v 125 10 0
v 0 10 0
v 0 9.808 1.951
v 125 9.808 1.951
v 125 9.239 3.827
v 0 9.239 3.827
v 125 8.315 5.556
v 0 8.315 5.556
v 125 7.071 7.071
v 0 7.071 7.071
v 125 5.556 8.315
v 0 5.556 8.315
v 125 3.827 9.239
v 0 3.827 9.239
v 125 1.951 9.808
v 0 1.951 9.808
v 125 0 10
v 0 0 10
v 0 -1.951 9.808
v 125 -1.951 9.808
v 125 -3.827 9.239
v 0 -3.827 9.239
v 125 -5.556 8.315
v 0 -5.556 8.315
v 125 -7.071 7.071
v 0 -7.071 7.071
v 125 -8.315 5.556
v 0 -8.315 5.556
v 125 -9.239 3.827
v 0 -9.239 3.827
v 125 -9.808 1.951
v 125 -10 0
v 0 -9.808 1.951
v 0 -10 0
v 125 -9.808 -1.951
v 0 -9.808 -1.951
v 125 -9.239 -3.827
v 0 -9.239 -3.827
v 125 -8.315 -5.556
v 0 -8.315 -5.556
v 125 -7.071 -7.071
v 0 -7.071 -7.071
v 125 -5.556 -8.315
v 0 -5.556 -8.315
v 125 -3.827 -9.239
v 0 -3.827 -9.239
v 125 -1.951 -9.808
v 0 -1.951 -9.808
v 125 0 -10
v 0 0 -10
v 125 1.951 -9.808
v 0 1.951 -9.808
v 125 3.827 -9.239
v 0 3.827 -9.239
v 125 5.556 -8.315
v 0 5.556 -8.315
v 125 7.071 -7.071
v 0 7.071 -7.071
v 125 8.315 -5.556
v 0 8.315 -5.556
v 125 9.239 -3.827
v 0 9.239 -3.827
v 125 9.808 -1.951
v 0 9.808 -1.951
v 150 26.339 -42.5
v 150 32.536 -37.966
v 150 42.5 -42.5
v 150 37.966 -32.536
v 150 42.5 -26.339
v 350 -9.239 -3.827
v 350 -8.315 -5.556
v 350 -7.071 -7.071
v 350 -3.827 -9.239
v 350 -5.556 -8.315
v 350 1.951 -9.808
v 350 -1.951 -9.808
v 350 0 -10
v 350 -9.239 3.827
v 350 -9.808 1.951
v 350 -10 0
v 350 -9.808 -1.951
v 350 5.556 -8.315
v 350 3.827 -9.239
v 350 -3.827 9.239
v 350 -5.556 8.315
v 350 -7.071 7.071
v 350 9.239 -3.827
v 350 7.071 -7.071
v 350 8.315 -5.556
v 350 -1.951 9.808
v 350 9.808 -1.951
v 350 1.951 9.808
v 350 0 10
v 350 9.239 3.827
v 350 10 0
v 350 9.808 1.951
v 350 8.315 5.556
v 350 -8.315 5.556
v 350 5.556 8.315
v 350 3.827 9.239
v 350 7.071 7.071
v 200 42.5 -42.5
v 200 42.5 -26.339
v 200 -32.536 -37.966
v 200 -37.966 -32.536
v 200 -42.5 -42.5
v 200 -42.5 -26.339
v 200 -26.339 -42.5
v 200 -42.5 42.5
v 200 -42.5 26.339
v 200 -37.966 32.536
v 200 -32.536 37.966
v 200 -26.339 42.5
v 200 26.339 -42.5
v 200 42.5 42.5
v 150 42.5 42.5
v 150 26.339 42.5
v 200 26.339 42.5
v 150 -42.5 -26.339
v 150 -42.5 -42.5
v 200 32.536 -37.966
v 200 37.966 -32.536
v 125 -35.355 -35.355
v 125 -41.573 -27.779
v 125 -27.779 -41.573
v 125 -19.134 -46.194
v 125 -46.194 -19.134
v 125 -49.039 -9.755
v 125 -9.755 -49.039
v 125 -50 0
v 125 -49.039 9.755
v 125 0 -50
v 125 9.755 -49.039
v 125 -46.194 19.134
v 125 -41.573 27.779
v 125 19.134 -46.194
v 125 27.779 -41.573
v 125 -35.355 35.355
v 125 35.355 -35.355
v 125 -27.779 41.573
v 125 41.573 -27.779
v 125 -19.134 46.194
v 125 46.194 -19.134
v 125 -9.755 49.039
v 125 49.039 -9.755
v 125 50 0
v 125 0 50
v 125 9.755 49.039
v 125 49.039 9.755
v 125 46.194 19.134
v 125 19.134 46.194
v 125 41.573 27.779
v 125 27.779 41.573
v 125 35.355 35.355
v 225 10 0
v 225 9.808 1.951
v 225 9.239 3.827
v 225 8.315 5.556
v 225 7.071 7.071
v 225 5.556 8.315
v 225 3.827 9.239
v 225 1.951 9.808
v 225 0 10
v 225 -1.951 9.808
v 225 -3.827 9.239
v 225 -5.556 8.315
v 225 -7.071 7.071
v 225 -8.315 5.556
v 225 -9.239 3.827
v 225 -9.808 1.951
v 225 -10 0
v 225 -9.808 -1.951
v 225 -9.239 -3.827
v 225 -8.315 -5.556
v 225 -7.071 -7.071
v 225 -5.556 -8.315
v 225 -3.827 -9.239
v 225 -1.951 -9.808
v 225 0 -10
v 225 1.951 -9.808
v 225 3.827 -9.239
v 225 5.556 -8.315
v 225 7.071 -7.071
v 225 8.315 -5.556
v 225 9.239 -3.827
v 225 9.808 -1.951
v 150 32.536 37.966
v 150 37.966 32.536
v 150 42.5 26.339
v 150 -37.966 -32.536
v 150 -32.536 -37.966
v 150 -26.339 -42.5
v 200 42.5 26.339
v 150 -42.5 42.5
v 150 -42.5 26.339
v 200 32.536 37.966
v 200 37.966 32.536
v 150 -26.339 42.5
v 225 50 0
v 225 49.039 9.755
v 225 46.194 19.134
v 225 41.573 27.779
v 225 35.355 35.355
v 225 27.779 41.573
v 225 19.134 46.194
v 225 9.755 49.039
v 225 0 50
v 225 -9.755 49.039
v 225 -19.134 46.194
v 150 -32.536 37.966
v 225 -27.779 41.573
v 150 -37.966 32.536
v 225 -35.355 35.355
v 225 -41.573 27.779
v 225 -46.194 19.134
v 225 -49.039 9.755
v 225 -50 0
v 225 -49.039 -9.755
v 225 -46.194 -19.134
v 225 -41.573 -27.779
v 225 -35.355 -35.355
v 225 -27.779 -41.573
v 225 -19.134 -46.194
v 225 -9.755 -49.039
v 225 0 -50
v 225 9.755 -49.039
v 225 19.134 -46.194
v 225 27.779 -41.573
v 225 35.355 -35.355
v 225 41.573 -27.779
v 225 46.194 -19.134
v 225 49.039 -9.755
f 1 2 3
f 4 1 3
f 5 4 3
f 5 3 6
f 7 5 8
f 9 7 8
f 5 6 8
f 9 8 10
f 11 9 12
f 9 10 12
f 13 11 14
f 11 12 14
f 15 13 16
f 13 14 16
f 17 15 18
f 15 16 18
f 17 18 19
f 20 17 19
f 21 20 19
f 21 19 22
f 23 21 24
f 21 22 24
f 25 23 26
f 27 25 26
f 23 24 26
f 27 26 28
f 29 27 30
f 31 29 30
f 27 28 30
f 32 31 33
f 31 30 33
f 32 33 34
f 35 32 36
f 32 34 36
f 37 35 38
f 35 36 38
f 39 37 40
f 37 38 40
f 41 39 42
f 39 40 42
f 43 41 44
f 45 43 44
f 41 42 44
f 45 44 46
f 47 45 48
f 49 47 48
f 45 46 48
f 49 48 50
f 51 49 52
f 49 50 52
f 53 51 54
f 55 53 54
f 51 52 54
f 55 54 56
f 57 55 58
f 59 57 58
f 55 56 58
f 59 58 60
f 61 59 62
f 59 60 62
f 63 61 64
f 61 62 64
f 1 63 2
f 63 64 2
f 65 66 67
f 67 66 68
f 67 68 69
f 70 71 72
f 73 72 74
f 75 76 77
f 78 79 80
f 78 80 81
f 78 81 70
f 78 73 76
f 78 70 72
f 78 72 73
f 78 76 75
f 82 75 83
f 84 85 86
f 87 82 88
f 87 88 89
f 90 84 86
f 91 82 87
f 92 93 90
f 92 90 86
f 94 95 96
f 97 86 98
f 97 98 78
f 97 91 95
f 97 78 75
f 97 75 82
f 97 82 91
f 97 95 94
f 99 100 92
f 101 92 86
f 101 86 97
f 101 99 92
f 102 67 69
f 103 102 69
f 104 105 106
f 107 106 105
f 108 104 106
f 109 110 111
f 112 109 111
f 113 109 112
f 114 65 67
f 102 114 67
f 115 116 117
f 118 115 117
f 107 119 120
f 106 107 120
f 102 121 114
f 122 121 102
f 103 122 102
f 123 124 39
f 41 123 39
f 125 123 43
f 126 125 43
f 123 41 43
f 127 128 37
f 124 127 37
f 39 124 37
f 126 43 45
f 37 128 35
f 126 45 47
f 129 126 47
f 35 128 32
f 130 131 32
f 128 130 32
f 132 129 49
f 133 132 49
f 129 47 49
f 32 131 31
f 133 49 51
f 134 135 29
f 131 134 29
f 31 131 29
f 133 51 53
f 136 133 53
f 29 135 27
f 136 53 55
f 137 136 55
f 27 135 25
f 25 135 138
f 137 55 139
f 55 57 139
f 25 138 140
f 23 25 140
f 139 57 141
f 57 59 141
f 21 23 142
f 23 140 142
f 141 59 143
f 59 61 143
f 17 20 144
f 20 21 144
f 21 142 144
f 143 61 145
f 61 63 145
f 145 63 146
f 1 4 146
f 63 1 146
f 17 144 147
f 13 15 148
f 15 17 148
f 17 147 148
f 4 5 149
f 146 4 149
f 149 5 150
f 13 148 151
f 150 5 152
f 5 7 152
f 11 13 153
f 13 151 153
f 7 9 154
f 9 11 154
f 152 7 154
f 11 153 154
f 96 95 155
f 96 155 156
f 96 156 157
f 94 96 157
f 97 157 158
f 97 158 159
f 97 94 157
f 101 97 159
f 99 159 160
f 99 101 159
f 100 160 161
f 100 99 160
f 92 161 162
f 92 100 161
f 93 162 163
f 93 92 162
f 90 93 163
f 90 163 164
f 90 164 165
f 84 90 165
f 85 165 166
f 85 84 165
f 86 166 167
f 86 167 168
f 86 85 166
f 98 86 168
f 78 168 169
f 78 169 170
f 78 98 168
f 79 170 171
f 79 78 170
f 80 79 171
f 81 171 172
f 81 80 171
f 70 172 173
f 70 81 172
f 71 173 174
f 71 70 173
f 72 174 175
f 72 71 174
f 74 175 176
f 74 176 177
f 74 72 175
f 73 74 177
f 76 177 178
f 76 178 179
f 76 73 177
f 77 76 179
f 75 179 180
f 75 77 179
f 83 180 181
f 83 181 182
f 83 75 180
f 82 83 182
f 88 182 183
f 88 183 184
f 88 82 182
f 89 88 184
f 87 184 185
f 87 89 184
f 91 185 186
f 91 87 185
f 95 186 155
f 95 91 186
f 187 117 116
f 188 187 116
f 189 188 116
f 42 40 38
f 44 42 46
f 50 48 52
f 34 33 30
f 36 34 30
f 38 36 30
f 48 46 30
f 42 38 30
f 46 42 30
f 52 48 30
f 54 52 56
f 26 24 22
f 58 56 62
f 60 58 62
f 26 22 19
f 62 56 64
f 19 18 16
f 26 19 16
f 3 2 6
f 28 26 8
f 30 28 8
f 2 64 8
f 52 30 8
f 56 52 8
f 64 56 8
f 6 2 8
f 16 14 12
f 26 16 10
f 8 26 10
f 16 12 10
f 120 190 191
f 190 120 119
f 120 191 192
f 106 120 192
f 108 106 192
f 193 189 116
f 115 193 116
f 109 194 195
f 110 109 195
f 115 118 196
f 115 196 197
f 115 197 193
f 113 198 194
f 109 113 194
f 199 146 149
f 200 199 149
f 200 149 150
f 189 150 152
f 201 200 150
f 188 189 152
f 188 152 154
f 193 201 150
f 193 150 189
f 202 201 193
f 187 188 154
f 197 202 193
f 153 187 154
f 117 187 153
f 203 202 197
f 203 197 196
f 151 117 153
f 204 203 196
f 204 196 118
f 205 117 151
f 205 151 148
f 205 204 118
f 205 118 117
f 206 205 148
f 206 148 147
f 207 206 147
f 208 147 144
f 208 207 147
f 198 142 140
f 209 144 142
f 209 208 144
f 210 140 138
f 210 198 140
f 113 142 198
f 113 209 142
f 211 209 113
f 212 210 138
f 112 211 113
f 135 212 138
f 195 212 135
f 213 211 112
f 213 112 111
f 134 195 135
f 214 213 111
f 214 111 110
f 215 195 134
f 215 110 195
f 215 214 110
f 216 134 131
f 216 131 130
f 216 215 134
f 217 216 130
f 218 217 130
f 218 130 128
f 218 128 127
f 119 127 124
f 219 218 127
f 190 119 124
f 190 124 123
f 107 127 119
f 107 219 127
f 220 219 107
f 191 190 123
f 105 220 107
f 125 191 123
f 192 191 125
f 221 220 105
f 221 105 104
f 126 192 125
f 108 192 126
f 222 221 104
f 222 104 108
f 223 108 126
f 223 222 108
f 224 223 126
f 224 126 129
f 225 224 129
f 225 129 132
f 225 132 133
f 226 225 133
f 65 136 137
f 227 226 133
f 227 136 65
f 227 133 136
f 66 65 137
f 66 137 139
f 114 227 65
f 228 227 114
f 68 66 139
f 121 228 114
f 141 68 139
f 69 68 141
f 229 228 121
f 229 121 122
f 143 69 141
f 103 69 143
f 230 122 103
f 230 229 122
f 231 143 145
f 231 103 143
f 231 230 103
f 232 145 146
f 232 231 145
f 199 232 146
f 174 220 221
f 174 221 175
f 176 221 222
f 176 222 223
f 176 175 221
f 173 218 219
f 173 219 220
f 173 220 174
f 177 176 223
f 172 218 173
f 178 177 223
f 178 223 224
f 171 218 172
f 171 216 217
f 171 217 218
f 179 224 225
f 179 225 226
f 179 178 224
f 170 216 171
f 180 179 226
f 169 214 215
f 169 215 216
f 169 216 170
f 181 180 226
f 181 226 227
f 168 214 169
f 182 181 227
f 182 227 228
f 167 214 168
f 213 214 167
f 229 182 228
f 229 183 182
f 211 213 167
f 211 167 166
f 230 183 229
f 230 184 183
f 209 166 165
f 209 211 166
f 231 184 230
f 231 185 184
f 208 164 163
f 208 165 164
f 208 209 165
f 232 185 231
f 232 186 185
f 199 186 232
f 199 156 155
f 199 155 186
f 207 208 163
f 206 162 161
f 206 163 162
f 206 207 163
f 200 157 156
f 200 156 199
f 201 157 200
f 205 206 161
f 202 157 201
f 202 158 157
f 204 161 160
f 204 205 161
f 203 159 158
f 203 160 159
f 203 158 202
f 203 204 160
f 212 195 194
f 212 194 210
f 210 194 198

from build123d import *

# Parameters (mm, degrees)
F0_R     = 10
F1_DEPTH = 125
F2_R     = 50
F2_R_2   = 10
F3_DEPTH = 50
F5_DEPTH = 25


with BuildPart() as f1:
    # F0 (on Right) → F1 (new body)
    with BuildSketch(Plane.YZ):
        Circle(F0_R)
    extrude(amount=F1_DEPTH)

    # F2 (on face) → F3 (join)
    with BuildSketch(Plane.YZ.offset(125)):
        Circle(F2_R)
        Circle(F2_R_2, mode=Mode.SUBTRACT)
        Circle(F2_R_2)
    extrude(amount=F3_DEPTH)

    # F4 (on face) → F5 (join)
    with BuildSketch(Plane.YZ.offset(175)):
        with BuildLine():
            Line((-42.5, 42.5), (-42.5, 26.339134))
            ThreePointArc((-42.5, 26.339134), (-35.355339, 35.355339), (-26.339134, 42.5))
            Line((-26.339134, 42.5), (-42.5, 42.5))
        make_face()
        with BuildLine():
            ThreePointArc((26.339134, 42.5), (35.355339, 35.355339), (42.5, 26.339134))
            Line((42.5, 26.339134), (42.5, 42.5))
            Line((42.5, 42.5), (26.339134, 42.5))
        make_face()
        with BuildLine():
            Line((26.339134, -42.5), (42.5, -42.5))
            Line((42.5, -42.5), (42.5, -26.339134))
            ThreePointArc((42.5, -26.339134), (35.355339, -35.355339), (26.339134, -42.5))
        make_face()
        with BuildLine():
            Line((-42.5, -42.5), (-26.339134, -42.5))
            ThreePointArc((-26.339134, -42.5), (-35.355339, -35.355339), (-42.5, -26.339134))
            Line((-42.5, -26.339134), (-42.5, -42.5))
        make_face()
        with BuildLine():
            Line((-26.339134, -42.5), (26.339134, -42.5))
            ThreePointArc((26.339134, -42.5), (35.355339, -35.355339), (42.5, -26.339134))
            Line((42.5, -26.339134), (42.5, 26.339134))
            ThreePointArc((42.5, 26.339134), (35.355339, 35.355339), (26.339134, 42.5))
            Line((26.339134, 42.5), (-26.339134, 42.5))
            ThreePointArc((-26.339134, 42.5), (-35.355339, 35.355339), (-42.5, 26.339134))
            Line((-42.5, 26.339134), (-42.5, -26.339134))
            ThreePointArc((-42.5, -26.339134), (-35.355339, -35.355339), (-26.339134, -42.5))
        make_face()
    extrude(amount=-F5_DEPTH)

    # F6: F1 across face


with BuildPart() as f1_1:
    add(f1.part)
    add(f1.part.mirror(Plane.YZ.offset(175)))


solid = f1_1.part
